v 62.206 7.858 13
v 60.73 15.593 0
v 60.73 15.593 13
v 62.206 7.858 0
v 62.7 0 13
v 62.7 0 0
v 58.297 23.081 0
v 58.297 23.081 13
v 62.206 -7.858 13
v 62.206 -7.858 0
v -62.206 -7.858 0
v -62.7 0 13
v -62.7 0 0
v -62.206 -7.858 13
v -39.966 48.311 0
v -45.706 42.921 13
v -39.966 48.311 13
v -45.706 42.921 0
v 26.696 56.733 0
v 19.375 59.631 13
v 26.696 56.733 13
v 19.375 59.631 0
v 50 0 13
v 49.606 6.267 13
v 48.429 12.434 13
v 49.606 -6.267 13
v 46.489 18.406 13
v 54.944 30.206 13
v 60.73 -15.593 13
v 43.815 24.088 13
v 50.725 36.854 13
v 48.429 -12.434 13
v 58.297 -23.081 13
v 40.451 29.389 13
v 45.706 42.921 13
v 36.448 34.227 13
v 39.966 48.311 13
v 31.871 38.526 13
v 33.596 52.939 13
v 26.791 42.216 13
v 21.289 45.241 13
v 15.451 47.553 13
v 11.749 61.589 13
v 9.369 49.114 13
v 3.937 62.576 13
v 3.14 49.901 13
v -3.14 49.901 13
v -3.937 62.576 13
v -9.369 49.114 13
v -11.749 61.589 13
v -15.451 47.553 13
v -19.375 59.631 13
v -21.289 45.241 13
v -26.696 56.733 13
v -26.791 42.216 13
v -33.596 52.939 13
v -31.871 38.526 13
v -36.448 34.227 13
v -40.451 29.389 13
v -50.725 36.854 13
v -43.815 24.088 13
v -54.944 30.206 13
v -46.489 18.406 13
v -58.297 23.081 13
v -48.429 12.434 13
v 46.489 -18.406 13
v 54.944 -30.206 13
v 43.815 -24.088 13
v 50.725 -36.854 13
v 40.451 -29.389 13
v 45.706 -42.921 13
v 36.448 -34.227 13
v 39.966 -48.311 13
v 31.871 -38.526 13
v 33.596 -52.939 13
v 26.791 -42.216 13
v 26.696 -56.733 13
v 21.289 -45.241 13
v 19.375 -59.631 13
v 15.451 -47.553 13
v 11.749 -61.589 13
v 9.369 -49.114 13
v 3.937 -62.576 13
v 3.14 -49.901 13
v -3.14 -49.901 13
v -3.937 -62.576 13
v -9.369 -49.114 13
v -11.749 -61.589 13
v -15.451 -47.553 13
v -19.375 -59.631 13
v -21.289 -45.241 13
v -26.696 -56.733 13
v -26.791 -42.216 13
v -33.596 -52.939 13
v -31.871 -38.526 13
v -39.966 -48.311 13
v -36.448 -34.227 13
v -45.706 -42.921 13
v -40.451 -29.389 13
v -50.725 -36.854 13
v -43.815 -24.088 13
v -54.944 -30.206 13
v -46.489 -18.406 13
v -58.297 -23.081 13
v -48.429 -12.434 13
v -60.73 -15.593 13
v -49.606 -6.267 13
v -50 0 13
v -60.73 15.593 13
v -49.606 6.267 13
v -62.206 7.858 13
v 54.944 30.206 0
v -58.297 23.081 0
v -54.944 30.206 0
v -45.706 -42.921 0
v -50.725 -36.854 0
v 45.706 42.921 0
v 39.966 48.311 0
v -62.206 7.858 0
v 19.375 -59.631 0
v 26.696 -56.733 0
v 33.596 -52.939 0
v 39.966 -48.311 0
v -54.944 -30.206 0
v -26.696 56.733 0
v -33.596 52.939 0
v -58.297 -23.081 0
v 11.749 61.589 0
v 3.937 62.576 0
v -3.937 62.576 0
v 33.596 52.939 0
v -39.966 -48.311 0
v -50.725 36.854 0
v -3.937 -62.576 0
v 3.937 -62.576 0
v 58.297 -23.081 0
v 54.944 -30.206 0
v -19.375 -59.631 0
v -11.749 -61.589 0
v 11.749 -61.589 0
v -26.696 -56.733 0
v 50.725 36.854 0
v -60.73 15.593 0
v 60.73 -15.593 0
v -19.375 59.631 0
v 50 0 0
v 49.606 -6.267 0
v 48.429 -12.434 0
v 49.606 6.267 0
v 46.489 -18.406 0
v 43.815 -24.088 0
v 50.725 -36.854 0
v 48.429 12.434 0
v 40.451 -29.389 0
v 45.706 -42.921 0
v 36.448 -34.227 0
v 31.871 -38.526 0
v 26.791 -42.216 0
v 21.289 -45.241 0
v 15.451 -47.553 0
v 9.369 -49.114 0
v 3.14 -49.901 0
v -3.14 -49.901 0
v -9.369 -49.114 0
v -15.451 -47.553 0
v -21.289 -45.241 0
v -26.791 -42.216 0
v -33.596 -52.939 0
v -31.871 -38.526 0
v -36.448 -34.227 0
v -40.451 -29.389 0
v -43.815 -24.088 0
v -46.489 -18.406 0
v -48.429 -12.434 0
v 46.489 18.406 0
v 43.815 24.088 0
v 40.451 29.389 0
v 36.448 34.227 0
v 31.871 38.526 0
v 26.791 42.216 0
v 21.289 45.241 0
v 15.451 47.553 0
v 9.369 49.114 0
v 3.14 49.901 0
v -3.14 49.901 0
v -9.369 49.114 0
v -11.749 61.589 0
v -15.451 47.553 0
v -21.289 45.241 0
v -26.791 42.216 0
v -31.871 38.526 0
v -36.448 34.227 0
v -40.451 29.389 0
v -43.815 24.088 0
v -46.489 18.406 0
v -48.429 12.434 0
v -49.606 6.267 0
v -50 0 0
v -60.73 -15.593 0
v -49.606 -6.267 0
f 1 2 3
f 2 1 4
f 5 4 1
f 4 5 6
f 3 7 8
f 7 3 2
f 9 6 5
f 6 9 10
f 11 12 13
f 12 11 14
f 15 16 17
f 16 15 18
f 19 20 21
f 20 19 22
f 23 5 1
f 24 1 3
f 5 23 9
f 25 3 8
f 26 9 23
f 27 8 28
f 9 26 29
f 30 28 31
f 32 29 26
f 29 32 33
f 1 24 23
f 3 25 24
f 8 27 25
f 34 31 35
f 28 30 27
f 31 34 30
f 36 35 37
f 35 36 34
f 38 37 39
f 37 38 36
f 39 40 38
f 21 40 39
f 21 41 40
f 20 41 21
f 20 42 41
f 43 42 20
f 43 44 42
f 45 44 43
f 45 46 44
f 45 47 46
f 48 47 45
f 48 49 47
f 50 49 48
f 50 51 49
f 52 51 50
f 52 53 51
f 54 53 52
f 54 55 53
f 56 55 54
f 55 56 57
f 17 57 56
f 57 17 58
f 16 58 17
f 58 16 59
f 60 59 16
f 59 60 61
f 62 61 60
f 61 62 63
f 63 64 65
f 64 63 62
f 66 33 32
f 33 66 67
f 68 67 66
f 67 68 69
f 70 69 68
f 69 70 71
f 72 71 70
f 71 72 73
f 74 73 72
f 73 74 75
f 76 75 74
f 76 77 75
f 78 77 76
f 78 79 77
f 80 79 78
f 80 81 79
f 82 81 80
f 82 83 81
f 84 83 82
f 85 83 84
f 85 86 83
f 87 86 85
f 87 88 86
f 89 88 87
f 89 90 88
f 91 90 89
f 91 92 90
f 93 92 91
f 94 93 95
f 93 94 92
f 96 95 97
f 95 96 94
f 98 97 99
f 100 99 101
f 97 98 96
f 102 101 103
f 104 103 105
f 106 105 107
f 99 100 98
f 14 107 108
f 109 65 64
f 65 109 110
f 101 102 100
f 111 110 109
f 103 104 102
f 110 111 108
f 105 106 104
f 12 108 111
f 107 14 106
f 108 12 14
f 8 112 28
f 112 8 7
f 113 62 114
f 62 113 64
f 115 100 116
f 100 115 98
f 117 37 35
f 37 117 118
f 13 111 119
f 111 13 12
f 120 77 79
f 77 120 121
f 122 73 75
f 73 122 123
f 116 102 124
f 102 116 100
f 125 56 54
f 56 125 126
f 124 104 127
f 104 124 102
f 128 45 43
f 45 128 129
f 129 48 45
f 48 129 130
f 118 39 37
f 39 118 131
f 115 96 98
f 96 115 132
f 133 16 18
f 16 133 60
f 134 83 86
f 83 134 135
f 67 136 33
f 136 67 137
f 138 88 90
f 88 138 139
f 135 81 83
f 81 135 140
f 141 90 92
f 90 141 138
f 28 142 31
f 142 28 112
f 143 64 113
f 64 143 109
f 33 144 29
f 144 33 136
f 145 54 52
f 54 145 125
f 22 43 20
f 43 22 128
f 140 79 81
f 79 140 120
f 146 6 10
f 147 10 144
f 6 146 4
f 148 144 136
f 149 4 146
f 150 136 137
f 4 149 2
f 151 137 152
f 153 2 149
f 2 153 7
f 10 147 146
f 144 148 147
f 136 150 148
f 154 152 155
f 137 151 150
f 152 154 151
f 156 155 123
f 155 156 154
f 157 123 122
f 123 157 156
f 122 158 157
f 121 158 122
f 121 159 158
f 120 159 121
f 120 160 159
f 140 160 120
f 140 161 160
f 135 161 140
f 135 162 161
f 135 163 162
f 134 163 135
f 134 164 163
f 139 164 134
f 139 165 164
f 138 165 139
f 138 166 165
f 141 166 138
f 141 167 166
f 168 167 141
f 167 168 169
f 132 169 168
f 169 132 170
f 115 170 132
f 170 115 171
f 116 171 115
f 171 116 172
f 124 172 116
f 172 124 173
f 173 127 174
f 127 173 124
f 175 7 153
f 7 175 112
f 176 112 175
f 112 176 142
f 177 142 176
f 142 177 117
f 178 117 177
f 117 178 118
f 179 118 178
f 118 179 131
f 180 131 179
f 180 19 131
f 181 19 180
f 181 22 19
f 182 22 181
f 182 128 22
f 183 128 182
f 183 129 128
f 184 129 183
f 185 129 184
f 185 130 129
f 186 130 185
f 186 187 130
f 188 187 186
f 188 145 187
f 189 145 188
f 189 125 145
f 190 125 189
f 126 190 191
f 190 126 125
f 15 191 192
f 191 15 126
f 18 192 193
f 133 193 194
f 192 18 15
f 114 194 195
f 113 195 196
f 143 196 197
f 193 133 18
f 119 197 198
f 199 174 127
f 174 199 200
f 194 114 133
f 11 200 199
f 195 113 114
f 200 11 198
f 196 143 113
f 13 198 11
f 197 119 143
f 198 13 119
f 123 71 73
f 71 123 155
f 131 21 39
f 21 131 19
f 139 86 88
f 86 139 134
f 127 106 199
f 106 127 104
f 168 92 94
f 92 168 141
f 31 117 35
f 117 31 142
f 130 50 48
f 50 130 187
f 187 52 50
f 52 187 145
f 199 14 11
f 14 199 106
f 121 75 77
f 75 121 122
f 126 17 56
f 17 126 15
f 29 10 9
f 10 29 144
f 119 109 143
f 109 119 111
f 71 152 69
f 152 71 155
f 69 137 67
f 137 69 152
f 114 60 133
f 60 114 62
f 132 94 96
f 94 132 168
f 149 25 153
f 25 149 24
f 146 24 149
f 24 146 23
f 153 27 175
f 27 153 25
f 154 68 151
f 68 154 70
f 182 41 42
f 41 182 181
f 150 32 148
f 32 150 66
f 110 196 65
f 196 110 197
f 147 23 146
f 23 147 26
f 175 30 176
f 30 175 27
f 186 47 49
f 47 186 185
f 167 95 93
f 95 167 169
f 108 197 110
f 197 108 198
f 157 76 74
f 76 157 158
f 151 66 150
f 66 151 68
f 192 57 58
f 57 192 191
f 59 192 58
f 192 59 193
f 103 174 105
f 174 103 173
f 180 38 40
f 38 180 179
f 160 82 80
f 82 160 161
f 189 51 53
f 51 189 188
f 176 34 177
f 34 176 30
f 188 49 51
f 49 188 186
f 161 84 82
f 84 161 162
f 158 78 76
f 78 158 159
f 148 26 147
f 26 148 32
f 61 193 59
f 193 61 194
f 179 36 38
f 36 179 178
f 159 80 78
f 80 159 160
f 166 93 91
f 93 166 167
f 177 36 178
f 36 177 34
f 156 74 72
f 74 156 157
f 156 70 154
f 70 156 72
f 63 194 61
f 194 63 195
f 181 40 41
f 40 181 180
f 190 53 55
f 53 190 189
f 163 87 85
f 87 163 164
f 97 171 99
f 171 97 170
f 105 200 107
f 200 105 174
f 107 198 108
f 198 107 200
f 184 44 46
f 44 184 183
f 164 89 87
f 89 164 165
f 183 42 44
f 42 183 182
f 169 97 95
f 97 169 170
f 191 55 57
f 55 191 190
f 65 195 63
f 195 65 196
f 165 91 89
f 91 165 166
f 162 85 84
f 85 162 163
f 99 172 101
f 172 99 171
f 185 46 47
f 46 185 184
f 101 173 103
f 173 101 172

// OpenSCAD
$fn = 50;


difference() {
	union() {
		cylinder(h = 13, r = 62.7000000000);
	}
	union() {
		cylinder(h = 13, r = 50.0000000000);
	}
}
